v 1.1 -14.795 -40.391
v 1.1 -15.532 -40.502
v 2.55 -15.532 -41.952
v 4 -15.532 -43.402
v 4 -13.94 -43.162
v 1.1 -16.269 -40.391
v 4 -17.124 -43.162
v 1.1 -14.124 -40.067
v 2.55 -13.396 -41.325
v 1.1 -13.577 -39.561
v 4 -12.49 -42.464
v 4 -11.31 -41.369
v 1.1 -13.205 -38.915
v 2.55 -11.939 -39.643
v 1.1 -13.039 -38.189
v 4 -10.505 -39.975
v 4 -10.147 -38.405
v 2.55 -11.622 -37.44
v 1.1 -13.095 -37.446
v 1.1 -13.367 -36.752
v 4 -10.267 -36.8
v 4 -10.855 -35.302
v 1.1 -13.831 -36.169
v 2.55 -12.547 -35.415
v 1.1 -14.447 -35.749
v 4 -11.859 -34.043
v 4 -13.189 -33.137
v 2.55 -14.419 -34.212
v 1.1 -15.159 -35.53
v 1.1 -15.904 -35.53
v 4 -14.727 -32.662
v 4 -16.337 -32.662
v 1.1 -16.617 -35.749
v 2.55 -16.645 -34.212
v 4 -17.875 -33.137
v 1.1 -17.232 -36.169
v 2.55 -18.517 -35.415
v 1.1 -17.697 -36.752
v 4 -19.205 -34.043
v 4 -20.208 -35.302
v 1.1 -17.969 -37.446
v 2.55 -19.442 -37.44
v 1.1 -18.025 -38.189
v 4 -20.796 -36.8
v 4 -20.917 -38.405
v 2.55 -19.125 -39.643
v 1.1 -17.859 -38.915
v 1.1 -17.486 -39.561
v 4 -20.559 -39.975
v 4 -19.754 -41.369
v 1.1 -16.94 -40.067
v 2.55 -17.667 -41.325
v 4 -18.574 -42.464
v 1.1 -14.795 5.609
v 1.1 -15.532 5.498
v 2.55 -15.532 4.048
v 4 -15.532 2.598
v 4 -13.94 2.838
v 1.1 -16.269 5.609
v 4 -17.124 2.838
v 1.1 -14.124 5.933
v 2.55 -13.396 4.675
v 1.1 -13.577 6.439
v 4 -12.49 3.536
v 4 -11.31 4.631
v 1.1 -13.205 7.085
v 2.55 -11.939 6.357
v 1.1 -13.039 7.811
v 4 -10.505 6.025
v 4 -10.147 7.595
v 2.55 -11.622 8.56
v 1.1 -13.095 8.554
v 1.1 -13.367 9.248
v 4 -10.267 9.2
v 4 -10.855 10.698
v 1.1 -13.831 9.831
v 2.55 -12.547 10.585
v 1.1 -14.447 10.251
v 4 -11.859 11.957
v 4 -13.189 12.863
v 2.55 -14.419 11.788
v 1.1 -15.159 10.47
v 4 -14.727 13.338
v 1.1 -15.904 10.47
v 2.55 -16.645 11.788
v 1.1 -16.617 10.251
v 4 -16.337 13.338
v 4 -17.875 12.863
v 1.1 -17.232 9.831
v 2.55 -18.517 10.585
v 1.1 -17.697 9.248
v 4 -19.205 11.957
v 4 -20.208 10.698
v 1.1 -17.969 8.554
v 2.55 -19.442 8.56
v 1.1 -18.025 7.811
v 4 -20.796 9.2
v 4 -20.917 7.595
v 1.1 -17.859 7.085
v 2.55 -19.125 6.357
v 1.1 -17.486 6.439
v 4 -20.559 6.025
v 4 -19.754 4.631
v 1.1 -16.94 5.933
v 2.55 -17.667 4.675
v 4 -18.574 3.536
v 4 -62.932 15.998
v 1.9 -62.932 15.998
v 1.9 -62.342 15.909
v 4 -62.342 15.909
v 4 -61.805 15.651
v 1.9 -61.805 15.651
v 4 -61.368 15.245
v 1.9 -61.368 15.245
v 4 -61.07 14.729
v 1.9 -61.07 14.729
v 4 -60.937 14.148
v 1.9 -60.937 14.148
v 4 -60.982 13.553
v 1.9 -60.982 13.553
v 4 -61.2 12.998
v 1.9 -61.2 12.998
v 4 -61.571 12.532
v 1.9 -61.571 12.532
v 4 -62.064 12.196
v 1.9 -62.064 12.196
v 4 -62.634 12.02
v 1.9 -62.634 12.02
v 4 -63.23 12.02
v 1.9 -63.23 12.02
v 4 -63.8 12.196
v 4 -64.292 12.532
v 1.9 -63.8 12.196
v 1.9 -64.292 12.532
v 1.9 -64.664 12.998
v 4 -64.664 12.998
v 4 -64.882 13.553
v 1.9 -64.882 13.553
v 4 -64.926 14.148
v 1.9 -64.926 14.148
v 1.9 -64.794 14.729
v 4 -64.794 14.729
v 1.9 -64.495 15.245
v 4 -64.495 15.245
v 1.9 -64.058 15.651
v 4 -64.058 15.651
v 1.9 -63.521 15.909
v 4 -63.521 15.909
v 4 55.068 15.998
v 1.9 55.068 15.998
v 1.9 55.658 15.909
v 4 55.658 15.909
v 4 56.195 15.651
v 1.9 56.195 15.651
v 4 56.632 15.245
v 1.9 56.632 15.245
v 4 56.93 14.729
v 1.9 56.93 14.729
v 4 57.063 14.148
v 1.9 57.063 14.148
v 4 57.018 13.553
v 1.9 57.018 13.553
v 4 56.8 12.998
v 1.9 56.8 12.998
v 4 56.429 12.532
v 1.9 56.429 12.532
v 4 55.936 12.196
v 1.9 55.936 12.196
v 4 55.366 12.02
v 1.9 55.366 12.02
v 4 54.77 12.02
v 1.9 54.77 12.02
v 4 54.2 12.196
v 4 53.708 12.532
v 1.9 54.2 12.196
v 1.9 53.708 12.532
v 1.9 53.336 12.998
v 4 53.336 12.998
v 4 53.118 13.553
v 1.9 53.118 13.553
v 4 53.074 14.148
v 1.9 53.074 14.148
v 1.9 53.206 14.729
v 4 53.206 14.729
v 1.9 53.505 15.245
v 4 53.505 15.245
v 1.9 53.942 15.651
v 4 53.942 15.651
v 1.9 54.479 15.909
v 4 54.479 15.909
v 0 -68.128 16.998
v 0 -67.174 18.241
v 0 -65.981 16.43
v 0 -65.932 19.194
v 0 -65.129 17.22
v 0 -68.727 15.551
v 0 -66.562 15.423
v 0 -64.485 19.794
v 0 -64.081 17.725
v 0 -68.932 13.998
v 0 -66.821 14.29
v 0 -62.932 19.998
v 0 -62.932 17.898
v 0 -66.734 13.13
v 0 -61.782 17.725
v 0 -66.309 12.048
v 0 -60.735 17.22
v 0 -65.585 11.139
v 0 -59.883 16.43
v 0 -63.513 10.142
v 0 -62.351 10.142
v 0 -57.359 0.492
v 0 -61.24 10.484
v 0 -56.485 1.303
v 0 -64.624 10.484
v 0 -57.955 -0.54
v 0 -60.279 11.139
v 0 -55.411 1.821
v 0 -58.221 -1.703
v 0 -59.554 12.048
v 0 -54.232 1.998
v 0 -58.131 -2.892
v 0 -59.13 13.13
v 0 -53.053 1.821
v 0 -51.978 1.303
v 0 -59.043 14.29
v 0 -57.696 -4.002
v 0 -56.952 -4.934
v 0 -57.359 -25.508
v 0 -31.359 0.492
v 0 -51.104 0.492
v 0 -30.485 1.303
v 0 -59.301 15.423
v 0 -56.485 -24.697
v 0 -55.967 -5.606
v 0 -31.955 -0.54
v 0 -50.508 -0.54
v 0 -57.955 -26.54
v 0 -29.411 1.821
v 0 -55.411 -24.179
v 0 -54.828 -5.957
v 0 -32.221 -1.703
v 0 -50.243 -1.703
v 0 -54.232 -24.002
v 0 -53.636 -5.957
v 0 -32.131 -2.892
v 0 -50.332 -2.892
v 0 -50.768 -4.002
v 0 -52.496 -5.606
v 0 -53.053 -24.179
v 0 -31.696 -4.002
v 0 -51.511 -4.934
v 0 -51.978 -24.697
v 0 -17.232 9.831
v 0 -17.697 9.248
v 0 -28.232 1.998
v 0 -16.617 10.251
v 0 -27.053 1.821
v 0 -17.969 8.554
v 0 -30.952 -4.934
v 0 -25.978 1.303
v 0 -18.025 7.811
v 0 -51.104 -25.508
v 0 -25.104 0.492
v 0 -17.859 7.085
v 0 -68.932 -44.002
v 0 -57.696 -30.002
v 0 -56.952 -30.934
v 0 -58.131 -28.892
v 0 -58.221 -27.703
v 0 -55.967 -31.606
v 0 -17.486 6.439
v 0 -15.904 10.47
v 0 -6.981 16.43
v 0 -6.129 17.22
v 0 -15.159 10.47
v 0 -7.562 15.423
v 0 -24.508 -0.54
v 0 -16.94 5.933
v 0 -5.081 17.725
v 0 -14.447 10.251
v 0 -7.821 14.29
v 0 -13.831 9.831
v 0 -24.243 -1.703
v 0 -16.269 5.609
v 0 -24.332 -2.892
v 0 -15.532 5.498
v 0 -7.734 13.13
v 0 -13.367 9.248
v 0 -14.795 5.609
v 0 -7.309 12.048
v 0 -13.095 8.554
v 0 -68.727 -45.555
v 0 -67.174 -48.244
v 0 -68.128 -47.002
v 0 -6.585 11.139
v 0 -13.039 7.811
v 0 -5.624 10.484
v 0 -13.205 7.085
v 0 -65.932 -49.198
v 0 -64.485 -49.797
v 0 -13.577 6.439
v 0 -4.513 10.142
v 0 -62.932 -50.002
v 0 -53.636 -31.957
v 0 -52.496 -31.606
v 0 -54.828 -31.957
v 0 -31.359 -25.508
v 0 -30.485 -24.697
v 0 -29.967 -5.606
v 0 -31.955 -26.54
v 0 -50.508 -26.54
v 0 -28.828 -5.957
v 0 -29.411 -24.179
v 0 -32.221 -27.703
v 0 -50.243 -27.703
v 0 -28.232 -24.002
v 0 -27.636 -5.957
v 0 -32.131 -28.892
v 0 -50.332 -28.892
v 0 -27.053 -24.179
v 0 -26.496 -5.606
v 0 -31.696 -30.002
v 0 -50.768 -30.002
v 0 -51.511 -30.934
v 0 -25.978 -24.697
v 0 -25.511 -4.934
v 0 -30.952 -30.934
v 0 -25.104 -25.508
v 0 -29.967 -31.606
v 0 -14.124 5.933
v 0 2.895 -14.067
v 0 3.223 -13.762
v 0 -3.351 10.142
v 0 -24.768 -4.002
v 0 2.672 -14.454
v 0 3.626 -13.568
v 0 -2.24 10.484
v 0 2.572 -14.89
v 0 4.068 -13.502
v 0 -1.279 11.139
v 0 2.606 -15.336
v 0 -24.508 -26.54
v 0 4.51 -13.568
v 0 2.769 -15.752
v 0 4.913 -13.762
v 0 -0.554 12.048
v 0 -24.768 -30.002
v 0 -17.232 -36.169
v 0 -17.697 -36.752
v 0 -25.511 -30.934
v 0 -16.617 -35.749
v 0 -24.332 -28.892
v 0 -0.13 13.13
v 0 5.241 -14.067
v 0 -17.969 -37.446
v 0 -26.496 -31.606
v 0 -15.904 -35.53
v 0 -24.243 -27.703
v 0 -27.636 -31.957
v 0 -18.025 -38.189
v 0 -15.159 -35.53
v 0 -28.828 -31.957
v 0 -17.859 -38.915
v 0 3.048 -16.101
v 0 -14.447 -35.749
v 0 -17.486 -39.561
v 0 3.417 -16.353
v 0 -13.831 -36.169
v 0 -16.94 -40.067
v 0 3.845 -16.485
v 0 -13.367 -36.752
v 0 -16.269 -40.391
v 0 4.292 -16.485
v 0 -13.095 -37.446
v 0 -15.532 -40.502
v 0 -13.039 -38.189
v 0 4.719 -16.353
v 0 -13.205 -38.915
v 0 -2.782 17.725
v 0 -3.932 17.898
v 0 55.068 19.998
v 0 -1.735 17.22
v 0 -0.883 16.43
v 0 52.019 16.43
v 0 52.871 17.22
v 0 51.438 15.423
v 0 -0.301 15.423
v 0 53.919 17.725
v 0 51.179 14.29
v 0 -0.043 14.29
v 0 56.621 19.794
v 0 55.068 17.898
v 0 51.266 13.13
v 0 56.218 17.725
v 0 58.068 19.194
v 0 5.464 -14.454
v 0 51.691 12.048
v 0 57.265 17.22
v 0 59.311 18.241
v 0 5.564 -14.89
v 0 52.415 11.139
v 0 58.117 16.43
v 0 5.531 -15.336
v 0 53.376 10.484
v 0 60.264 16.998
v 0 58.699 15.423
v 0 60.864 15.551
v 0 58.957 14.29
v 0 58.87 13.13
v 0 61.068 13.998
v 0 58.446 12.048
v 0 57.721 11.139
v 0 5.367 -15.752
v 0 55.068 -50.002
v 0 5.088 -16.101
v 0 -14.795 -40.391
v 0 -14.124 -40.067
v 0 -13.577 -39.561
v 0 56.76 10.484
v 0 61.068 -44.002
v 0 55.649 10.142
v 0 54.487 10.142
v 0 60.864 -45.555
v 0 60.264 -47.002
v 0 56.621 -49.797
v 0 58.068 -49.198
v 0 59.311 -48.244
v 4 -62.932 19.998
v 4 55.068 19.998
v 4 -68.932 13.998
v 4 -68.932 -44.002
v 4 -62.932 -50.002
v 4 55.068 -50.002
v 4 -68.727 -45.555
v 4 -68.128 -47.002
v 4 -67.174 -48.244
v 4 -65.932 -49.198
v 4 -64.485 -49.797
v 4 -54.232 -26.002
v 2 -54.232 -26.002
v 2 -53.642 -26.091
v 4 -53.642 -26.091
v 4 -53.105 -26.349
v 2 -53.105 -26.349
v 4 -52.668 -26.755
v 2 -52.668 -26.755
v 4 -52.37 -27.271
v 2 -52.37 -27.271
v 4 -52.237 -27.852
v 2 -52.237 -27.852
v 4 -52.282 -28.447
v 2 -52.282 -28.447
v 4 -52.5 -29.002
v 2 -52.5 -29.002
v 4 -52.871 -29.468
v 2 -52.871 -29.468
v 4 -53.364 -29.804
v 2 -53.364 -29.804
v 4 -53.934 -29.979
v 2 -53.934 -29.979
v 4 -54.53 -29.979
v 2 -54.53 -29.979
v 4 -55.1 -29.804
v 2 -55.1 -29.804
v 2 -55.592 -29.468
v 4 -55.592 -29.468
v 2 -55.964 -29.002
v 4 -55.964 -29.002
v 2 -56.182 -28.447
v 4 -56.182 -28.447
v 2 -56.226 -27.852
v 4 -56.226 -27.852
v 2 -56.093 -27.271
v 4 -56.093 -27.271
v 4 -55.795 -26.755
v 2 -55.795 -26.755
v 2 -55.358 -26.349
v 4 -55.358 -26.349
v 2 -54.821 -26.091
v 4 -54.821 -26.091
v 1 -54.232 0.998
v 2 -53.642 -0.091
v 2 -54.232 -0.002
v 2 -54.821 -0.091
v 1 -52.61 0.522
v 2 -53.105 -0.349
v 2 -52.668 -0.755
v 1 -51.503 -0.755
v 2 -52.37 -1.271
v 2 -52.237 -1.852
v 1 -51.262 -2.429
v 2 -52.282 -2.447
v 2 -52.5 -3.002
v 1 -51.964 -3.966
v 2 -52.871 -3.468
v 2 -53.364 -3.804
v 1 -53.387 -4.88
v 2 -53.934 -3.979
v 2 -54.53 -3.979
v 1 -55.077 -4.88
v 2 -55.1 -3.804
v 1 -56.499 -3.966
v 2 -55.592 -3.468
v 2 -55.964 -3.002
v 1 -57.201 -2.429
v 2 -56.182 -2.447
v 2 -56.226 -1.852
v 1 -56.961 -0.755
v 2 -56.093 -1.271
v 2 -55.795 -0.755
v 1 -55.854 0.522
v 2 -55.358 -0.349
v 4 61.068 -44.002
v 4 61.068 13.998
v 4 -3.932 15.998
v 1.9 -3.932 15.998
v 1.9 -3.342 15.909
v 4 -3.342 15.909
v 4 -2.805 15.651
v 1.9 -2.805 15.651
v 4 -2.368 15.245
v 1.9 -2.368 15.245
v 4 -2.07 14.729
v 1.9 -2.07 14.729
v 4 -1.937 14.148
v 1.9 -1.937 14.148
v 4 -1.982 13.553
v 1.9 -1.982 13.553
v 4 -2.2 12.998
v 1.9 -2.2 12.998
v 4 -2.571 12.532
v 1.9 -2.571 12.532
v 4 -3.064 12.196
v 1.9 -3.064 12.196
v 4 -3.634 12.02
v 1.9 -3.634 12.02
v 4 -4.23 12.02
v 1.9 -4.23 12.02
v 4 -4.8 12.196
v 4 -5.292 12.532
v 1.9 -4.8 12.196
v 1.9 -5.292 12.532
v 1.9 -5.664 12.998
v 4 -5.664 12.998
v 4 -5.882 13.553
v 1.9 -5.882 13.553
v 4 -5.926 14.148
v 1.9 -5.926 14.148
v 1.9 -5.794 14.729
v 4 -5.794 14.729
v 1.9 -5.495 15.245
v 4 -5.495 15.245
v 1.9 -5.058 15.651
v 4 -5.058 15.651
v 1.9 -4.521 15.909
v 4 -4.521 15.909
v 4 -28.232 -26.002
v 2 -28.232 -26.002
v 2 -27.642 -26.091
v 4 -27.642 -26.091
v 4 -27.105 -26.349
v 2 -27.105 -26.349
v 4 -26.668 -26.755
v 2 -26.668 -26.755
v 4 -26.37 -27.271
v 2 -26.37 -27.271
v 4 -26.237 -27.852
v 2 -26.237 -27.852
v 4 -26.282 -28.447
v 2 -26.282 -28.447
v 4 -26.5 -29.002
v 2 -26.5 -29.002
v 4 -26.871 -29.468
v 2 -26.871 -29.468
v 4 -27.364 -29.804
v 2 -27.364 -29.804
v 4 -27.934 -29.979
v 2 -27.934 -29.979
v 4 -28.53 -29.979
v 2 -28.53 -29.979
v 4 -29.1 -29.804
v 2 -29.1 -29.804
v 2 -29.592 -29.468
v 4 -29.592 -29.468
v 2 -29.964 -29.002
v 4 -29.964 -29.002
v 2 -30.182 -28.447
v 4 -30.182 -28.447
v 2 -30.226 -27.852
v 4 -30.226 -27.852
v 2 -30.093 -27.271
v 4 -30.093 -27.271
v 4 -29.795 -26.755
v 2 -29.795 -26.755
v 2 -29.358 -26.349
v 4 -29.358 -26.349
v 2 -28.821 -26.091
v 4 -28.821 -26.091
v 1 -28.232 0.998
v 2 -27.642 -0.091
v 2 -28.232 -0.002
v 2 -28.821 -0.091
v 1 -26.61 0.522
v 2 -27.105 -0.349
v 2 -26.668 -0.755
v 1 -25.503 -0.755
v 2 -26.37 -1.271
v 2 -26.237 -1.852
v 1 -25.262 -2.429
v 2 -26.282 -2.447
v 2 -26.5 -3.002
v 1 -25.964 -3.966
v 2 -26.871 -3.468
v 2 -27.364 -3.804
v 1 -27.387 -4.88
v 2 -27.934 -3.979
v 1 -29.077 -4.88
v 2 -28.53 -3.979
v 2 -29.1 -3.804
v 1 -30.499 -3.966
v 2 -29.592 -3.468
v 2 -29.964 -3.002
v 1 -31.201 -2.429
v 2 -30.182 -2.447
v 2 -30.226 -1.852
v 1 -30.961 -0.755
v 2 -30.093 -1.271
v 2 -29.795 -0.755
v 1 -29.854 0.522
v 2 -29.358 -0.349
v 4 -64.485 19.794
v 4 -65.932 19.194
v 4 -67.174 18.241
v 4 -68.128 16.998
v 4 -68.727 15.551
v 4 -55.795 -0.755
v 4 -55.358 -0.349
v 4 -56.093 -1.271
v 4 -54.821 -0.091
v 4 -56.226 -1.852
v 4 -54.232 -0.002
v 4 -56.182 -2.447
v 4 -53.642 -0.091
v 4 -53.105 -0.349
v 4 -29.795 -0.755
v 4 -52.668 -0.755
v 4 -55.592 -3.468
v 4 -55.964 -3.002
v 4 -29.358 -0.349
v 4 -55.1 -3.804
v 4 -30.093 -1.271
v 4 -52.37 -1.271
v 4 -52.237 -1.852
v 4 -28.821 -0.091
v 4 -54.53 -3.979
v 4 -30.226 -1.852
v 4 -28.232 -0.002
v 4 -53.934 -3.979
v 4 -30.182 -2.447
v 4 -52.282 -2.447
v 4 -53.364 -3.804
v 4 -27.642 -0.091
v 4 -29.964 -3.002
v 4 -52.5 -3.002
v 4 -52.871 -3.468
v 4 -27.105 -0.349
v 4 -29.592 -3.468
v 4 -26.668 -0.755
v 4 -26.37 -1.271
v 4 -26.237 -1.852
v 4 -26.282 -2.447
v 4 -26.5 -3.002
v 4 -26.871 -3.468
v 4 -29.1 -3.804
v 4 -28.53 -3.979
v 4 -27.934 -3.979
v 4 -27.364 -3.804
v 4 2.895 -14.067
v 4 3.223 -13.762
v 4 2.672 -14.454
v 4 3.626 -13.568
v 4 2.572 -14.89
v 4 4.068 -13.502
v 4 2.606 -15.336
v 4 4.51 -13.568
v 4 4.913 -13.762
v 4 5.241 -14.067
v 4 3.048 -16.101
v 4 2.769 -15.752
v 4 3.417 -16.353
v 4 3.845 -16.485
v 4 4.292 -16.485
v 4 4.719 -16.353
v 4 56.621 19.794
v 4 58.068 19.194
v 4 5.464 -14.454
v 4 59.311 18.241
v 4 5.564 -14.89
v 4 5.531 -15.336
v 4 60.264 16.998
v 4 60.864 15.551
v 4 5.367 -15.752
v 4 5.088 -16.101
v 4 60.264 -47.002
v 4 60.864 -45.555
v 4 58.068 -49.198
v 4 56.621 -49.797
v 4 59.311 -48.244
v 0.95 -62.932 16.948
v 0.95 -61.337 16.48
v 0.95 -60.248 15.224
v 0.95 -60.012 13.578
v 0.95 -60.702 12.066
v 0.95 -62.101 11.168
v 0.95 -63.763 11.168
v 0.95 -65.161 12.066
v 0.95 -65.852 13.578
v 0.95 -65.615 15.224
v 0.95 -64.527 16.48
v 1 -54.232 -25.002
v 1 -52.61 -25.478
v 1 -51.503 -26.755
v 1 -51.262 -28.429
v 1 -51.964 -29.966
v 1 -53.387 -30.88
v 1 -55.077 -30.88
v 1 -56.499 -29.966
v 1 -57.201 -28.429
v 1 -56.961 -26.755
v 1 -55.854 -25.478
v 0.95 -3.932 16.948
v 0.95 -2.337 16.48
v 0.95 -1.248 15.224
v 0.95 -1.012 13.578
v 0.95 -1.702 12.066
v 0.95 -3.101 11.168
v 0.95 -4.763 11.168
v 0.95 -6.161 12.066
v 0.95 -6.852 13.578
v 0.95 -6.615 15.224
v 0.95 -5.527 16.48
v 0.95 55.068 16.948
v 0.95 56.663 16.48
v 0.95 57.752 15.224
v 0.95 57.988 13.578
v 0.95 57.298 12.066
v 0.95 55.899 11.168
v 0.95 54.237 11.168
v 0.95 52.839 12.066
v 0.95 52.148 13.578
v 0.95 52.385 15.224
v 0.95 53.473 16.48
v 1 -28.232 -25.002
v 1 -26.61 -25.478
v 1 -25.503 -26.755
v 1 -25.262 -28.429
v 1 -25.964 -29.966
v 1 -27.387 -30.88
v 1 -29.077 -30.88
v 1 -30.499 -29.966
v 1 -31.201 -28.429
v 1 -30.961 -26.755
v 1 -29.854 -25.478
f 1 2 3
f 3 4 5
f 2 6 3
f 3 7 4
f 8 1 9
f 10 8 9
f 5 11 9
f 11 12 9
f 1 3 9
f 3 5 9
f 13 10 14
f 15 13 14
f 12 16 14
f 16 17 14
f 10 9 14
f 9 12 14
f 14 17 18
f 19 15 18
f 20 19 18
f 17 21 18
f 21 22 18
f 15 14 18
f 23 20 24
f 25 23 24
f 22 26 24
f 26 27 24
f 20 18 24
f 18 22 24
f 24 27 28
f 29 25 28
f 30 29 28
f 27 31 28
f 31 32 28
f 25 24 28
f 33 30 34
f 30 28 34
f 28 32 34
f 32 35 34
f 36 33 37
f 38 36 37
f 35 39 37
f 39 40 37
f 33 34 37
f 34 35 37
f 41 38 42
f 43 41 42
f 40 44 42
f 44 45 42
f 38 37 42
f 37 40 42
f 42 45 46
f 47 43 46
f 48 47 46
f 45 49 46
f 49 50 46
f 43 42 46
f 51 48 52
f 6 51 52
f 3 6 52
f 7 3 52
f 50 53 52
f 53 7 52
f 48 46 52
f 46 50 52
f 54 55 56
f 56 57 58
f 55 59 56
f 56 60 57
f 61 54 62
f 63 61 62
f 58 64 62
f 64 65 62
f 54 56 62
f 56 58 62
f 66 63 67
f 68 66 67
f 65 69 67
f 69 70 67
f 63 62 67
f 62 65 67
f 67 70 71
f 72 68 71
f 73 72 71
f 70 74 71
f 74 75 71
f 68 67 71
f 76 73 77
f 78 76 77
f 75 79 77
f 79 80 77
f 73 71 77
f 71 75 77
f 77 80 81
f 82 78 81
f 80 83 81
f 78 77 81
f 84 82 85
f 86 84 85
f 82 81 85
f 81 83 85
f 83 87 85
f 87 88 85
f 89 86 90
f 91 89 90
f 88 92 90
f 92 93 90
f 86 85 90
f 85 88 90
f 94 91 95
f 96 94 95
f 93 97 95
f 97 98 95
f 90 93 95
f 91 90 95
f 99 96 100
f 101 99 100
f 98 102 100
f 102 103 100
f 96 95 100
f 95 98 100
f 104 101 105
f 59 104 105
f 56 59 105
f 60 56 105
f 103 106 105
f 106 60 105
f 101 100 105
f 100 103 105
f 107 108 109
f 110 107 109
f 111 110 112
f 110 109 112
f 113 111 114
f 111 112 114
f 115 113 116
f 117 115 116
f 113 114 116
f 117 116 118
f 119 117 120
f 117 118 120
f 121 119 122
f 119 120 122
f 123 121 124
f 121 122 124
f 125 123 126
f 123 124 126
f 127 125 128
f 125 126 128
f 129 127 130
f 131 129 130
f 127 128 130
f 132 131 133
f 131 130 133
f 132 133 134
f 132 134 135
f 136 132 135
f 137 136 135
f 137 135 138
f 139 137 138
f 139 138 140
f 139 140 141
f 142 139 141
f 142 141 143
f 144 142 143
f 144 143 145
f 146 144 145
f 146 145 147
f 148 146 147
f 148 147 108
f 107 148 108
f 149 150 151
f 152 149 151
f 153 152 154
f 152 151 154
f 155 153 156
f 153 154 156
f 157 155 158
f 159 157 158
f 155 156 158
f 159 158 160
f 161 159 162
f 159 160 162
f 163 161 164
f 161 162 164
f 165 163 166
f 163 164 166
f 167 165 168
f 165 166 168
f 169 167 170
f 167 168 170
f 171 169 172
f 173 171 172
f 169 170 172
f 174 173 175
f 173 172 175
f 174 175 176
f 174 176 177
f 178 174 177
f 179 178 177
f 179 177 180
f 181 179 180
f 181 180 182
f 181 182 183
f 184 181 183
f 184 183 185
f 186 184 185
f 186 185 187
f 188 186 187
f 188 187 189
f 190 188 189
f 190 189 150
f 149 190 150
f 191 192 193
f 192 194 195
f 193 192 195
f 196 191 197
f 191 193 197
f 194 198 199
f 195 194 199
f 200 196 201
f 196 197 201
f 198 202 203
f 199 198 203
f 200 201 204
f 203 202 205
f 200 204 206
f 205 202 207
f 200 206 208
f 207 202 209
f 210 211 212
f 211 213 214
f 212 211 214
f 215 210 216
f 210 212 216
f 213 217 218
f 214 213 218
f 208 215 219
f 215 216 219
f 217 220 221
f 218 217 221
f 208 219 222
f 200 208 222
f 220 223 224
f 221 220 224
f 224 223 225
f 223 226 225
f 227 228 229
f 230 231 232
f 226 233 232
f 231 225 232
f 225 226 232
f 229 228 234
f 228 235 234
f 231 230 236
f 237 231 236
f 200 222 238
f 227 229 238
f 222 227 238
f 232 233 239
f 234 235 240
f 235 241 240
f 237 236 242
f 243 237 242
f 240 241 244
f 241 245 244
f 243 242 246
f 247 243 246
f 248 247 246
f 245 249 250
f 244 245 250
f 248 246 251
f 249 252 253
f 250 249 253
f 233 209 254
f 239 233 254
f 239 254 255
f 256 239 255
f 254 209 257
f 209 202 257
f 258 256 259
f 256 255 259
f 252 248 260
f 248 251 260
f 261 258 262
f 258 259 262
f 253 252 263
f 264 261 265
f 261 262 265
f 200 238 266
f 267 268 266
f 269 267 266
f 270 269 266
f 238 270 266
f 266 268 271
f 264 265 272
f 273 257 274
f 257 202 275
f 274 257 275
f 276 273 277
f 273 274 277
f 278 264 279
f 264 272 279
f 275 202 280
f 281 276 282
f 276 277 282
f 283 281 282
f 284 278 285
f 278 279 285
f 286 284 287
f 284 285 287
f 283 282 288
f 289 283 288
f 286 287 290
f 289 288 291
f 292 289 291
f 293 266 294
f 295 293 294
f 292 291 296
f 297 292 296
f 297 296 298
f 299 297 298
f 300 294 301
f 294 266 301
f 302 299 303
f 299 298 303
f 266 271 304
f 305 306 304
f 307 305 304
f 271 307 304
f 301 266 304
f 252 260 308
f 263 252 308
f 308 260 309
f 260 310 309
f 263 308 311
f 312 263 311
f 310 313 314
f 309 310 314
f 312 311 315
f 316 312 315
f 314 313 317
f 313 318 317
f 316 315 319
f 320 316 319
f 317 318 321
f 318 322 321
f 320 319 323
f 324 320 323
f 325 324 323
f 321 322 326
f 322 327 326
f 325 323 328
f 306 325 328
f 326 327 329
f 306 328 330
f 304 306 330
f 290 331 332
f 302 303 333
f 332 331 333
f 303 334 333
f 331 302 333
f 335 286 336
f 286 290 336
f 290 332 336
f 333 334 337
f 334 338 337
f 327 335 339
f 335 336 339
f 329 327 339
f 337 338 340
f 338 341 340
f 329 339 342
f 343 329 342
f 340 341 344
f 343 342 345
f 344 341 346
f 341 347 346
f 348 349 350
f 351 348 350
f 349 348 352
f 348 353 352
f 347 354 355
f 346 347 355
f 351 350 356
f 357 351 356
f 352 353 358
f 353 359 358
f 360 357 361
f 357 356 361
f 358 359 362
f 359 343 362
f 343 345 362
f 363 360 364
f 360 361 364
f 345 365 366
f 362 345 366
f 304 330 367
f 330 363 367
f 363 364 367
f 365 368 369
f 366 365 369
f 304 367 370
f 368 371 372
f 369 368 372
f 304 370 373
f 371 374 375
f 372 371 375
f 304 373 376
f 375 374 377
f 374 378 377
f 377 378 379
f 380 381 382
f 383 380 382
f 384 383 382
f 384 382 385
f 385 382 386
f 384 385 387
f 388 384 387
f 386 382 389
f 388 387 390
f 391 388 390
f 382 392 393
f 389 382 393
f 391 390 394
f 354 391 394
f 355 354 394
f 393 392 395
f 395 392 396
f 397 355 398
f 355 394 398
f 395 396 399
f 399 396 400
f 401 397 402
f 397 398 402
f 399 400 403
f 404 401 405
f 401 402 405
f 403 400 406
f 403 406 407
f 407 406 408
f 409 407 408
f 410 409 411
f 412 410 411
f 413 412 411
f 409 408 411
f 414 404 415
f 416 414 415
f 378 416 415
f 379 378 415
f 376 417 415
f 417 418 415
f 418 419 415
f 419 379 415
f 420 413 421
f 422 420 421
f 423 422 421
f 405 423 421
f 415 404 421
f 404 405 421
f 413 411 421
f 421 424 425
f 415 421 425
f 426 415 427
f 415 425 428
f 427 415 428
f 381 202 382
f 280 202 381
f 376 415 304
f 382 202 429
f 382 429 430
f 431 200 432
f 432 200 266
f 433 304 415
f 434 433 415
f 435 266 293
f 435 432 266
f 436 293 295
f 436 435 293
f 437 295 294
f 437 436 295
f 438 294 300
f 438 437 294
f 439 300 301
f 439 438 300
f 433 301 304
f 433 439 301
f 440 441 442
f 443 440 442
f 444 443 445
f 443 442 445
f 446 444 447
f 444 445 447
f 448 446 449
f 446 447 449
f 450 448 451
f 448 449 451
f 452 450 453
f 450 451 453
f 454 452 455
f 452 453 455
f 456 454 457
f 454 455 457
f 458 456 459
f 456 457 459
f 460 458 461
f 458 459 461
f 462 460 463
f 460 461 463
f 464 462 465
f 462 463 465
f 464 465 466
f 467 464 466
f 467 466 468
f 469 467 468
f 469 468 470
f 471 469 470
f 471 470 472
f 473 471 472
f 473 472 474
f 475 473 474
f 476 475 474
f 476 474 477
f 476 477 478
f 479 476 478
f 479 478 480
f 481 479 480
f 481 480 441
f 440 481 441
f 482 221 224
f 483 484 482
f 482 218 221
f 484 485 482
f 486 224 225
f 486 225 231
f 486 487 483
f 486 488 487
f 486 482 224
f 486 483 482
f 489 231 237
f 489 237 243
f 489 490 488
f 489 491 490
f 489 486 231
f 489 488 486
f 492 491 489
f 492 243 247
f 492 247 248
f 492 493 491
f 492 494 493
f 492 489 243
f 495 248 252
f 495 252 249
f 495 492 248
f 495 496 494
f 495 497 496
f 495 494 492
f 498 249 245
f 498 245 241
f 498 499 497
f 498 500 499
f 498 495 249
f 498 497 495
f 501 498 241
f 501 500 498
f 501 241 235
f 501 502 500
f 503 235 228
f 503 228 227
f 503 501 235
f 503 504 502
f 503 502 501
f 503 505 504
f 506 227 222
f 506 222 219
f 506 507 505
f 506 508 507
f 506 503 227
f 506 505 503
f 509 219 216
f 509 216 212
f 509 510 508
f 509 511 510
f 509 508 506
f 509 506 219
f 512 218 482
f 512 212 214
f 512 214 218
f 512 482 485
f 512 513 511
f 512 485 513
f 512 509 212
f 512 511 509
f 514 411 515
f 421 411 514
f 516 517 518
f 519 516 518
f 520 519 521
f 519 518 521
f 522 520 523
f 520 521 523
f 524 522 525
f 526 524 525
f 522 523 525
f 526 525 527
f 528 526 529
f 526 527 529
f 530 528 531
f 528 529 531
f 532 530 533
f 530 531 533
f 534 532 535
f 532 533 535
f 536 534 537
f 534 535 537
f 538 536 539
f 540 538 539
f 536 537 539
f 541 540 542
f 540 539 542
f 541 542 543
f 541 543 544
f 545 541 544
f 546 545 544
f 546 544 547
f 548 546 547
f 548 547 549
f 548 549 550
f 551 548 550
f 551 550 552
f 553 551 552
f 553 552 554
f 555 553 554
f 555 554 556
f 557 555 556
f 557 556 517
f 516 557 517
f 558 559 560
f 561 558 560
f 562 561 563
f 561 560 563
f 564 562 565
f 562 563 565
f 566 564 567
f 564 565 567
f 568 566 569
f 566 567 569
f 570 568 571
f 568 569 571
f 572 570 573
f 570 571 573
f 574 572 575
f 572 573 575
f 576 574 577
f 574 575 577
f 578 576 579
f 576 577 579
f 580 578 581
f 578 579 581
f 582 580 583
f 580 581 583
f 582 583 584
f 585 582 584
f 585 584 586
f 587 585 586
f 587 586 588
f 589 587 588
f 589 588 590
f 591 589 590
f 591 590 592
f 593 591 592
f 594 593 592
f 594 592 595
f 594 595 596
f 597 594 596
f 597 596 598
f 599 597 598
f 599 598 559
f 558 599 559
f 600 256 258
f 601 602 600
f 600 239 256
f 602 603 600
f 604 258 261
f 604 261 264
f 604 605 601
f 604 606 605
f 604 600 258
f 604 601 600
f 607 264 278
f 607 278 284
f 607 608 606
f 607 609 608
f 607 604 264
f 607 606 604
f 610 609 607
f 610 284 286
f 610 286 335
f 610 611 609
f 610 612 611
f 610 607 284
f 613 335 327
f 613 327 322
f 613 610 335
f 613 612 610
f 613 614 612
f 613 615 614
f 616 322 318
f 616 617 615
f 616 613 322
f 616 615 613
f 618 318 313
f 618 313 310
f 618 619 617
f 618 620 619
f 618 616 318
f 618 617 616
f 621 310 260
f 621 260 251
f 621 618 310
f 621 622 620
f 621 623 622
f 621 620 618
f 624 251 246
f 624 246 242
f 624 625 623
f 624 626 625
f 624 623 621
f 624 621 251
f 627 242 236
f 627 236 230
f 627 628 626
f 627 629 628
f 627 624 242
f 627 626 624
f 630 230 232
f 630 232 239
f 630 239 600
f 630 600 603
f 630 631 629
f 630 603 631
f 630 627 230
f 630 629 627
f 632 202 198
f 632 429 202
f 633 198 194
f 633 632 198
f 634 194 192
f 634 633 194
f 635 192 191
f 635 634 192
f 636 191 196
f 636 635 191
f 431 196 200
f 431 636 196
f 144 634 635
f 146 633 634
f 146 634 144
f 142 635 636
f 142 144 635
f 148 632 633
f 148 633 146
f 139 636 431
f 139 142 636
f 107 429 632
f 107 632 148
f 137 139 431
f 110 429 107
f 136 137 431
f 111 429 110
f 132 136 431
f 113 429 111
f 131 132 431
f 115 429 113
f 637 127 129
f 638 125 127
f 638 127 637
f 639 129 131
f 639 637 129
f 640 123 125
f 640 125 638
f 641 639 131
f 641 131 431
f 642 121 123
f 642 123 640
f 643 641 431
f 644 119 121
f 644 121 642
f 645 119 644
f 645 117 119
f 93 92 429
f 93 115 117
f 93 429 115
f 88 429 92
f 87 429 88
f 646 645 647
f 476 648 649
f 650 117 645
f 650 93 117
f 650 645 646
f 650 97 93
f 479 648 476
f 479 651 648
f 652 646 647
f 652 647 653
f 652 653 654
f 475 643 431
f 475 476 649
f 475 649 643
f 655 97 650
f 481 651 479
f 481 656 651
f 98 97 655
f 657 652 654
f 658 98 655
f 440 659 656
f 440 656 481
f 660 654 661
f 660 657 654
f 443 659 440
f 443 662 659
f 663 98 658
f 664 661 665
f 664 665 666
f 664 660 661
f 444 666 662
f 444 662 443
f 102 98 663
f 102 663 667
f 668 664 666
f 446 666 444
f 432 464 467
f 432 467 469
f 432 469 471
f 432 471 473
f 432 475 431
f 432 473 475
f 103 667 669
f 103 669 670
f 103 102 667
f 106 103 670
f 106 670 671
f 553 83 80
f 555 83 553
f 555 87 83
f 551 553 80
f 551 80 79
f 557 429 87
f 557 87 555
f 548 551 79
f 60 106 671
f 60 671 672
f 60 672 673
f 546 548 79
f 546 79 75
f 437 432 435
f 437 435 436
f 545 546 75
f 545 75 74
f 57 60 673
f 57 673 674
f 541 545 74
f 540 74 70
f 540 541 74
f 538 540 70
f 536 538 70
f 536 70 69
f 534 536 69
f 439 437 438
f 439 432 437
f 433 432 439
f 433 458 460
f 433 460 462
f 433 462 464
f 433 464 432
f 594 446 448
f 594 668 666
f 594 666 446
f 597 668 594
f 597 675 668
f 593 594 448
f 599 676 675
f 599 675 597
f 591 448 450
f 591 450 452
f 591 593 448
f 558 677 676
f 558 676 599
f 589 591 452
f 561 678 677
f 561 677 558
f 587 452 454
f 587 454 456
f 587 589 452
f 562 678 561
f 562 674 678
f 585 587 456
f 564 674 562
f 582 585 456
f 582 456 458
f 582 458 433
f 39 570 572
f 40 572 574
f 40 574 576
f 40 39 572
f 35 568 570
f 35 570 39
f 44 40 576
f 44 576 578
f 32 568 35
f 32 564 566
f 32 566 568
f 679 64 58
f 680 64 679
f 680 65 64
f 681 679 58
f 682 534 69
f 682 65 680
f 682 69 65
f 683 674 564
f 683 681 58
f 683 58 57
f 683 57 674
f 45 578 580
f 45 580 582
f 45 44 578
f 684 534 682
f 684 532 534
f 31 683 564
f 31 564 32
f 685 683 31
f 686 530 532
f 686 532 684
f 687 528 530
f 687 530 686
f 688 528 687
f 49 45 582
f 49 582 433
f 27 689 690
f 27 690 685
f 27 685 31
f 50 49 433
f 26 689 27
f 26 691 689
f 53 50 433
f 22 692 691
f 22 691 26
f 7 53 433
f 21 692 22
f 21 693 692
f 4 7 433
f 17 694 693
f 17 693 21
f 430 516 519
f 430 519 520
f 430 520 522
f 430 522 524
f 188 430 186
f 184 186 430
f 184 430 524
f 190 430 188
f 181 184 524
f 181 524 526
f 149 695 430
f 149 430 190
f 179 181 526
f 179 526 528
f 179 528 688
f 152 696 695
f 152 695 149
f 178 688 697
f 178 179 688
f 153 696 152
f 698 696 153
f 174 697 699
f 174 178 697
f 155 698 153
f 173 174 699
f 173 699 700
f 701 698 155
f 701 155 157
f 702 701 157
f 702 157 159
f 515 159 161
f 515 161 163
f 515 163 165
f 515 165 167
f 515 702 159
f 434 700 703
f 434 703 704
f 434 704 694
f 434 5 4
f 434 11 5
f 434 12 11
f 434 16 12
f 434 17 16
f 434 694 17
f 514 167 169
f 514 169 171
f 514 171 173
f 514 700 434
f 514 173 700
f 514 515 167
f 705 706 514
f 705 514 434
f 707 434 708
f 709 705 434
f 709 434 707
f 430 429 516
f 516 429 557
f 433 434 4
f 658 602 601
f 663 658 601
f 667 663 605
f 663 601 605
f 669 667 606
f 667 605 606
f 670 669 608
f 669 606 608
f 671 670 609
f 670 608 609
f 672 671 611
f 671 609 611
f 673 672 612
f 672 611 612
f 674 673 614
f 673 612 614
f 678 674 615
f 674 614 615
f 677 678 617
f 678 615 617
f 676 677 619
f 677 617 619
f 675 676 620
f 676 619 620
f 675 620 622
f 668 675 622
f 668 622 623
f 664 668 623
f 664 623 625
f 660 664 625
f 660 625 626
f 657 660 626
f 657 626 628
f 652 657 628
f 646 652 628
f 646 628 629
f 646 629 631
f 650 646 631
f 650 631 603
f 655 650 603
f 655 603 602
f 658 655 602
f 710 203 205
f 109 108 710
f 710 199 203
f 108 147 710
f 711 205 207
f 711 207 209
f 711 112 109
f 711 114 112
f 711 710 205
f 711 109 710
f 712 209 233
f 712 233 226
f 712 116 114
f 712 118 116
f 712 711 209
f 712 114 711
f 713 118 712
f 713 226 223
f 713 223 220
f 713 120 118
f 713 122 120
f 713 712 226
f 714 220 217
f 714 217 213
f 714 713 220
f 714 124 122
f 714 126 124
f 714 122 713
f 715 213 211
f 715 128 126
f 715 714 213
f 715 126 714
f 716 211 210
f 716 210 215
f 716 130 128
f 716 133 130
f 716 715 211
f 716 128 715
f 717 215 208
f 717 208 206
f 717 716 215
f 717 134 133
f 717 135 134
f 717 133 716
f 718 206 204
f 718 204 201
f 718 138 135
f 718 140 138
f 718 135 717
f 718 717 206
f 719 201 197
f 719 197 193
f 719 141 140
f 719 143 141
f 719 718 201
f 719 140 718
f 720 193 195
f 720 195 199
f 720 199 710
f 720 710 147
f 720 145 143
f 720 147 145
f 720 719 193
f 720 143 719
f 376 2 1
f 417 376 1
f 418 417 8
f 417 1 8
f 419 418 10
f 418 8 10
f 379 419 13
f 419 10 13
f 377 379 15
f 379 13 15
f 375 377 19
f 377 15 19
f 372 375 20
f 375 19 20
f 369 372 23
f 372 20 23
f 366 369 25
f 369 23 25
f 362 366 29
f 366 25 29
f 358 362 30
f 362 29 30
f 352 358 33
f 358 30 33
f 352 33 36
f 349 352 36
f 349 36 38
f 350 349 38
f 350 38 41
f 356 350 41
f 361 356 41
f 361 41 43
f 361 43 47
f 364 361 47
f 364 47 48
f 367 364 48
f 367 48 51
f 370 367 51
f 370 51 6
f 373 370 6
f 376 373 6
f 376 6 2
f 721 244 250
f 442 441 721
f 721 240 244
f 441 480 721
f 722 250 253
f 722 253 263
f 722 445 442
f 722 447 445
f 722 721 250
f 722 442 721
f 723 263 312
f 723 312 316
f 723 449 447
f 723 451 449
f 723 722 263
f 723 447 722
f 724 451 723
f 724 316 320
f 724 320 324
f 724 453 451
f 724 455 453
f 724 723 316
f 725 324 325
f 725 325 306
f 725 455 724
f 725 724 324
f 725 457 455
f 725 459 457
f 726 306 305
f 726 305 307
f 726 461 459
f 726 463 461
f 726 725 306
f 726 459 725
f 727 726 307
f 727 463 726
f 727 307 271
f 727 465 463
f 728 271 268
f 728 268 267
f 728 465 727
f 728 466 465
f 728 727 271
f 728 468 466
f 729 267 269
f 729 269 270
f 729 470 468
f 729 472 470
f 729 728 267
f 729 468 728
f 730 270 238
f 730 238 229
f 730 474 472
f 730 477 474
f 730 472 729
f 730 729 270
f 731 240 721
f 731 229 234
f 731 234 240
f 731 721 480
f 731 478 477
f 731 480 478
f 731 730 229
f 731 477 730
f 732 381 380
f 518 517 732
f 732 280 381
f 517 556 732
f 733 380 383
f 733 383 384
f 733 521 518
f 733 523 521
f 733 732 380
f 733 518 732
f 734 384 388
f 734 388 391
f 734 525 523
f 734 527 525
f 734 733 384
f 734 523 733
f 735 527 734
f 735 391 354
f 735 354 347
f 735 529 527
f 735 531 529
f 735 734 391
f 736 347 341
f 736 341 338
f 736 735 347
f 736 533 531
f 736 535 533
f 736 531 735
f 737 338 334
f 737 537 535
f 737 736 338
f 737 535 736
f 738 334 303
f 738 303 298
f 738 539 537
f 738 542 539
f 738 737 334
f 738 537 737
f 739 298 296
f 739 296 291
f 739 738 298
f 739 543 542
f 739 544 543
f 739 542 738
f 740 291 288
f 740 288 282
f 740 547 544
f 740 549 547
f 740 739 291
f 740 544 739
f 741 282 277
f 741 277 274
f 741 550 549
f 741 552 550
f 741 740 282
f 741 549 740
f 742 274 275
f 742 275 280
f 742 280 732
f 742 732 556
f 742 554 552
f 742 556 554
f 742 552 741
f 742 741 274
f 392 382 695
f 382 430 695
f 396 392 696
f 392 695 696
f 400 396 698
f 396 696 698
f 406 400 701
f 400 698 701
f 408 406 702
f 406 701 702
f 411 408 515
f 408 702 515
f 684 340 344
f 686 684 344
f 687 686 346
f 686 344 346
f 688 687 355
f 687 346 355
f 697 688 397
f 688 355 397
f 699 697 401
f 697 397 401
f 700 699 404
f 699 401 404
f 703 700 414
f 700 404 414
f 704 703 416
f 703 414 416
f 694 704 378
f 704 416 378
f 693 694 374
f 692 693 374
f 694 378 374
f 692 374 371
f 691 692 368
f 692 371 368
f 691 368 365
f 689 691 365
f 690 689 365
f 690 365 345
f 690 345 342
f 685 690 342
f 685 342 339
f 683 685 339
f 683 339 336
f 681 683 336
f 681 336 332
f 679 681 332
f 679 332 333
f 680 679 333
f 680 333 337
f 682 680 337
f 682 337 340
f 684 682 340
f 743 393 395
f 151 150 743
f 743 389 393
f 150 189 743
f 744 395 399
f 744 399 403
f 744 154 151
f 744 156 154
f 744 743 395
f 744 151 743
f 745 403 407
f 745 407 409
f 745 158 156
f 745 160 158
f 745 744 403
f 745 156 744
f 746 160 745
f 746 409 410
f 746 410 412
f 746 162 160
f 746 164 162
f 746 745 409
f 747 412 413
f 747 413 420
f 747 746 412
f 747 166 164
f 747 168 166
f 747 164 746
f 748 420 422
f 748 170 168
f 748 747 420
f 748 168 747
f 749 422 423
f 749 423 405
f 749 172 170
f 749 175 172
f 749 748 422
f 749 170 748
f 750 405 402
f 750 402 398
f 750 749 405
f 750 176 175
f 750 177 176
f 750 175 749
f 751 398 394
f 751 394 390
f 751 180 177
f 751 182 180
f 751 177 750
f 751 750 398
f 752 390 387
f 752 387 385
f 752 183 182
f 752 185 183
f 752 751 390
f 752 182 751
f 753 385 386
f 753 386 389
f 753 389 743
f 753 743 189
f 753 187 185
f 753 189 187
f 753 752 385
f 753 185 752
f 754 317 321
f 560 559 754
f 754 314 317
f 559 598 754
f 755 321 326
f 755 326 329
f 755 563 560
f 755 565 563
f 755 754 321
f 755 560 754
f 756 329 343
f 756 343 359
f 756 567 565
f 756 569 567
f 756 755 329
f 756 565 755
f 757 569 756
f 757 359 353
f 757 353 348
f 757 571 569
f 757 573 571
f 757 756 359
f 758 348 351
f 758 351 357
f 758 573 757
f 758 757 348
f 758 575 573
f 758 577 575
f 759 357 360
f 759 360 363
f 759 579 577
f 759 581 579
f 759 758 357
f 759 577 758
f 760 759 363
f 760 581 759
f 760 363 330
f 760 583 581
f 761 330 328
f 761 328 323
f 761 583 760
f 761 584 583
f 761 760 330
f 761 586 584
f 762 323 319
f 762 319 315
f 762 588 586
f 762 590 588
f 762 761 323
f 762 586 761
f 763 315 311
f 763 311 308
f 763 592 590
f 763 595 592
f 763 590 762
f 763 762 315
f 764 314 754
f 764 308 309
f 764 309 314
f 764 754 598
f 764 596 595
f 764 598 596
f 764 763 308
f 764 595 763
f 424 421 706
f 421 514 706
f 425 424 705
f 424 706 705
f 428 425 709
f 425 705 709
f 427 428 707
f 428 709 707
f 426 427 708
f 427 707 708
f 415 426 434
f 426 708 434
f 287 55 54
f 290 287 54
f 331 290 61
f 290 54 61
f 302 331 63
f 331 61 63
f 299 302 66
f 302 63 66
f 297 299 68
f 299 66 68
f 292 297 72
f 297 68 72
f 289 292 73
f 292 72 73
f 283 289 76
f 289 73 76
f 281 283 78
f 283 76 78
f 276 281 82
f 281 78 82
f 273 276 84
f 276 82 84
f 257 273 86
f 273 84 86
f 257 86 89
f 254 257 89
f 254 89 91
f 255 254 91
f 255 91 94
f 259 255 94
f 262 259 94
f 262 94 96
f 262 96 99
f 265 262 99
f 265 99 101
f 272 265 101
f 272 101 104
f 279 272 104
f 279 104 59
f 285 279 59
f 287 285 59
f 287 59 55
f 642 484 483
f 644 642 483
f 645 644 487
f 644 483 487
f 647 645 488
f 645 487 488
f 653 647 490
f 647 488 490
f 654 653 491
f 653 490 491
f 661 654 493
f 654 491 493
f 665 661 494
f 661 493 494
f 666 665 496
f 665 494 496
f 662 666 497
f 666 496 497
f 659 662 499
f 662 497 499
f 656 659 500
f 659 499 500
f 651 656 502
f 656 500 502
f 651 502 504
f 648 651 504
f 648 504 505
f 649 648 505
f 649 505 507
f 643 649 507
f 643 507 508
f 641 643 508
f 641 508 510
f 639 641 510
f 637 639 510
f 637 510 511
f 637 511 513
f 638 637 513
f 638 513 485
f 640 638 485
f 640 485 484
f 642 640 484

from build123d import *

# Parameters (mm, degrees)
SKETCH_1_W          = 70
SKETCH_1_H          = 130
EXTRUDE_1_DEPTH     = 4
SKETCH_2_R          = 2
CUT_EXTRUDE_1_DEPTH = 10
FILLET_1_R          = 6
CHAMFER_1_SIZE      = 2
SKETCH_3_R          = 2
CUT_EXTRUDE_2_DEPTH = 15
CHAMFER_2_SIZE      = 1.9
SKETCH_4_R          = 2.5
CUT_EXTRUDE_3_DEPTH = 15
CHAMFER_3_SIZE      = 2.9
SKETCH_5_R          = 1.5
CUT_EXTRUDE_4_DEPTH = 12


with BuildPart() as part:
    # Эскиз1 → Бобышка-Вытянуть1 (new body)
    with BuildSketch(Plane(origin=(0, 0, 0), x_dir=(0, 0, -1), z_dir=(1, 0, 0))):
        with Locations((15.001853179, -3.931833533)):
            Rectangle(SKETCH_1_W, SKETCH_1_H)
    extrude(amount=EXTRUDE_1_DEPTH)

    # Эскиз2 → Вырез-Вытянуть1 (cut)
    with BuildSketch(Plane.ZY):
        with Locations((-28.001653179, -28.231733533)):
            Circle(SKETCH_2_R)
        with Locations((-28.001653179, -54.231733533)):
            Circle(SKETCH_2_R)
        with Locations((-2.001653179, -28.231733533)):
            Circle(SKETCH_2_R)
        with Locations((-2.001653179, -54.231733533)):
            Circle(SKETCH_2_R)
    extrude(amount=-CUT_EXTRUDE_1_DEPTH, mode=Mode.SUBTRACT)

    # Скругление1
    fillet_1_edges = [part.edges().sort_by_distance(p)[0] for p in [
        (2, 61.068166467, 19.998146821),
        (2, 61.068166467, -50.001853179),
        (2, -68.931833533, -50.001853179),
        (2, -68.931833533, 19.998146821),
    ]]
    fillet(fillet_1_edges, radius=FILLET_1_R)

    # Фаска1
    chamfer_1_edges = [part.edges().sort_by_distance(p)[0] for p in [
        (0, -28.231733533, -30.001653179),
        (0, -54.231733533, -30.001653179),
        (0, -28.231733533, -4.001653179),
        (0, -54.231733533, -4.001653179),
    ]]
    chamfer(chamfer_1_edges, length=CHAMFER_1_SIZE)

    # Эскиз3 → Вырез-Вытянуть2 (cut)
    with BuildSketch(Plane.ZY):
        with Locations((13.998146821, 55.068166467)):
            Circle(SKETCH_3_R)
        with Locations((13.998146821, -62.931833533)):
            Circle(SKETCH_3_R)
        with Locations((13.998146821, -3.931833533)):
            Circle(SKETCH_3_R)
    extrude(amount=-CUT_EXTRUDE_2_DEPTH, mode=Mode.SUBTRACT)

    # Фаска2
    chamfer_2_edges = [part.edges().sort_by_distance(p)[0] for p in [
        (0, 55.068166467, 11.998146821),
        (0, -62.931833533, 11.998146821),
        (0, -3.931833533, 11.998146821),
    ]]
    chamfer(chamfer_2_edges, length=CHAMFER_2_SIZE)

    # Эскиз4 → Вырез-Вытянуть3 (cut)
    with BuildSketch(Plane(origin=(4, 0, 0), x_dir=(0, 0, -1), z_dir=(1, 0, 0))):
        with Locations((-7.998146821, -15.531833533)):
            Circle(SKETCH_4_R)
        with Locations((38.001853179, -15.531833533)):
            Circle(SKETCH_4_R)
    extrude(amount=-CUT_EXTRUDE_3_DEPTH, mode=Mode.SUBTRACT)

    # Фаска3
    chamfer_3_edges = [part.edges().sort_by_distance(p)[0] for p in [
        (4, -15.531833533, -35.501853179),
        (4, -15.531833533, 10.498146821),
    ]]
    chamfer(chamfer_3_edges, length=CHAMFER_3_SIZE)

    # Эскиз5 → Вырез-Вытянуть4 (cut)
    with BuildSketch(Plane.ZY):
        with Locations((-15.001853179, 4.068166467)):
            Circle(SKETCH_5_R)
    extrude(amount=-CUT_EXTRUDE_4_DEPTH, mode=Mode.SUBTRACT)


solid = part.part
